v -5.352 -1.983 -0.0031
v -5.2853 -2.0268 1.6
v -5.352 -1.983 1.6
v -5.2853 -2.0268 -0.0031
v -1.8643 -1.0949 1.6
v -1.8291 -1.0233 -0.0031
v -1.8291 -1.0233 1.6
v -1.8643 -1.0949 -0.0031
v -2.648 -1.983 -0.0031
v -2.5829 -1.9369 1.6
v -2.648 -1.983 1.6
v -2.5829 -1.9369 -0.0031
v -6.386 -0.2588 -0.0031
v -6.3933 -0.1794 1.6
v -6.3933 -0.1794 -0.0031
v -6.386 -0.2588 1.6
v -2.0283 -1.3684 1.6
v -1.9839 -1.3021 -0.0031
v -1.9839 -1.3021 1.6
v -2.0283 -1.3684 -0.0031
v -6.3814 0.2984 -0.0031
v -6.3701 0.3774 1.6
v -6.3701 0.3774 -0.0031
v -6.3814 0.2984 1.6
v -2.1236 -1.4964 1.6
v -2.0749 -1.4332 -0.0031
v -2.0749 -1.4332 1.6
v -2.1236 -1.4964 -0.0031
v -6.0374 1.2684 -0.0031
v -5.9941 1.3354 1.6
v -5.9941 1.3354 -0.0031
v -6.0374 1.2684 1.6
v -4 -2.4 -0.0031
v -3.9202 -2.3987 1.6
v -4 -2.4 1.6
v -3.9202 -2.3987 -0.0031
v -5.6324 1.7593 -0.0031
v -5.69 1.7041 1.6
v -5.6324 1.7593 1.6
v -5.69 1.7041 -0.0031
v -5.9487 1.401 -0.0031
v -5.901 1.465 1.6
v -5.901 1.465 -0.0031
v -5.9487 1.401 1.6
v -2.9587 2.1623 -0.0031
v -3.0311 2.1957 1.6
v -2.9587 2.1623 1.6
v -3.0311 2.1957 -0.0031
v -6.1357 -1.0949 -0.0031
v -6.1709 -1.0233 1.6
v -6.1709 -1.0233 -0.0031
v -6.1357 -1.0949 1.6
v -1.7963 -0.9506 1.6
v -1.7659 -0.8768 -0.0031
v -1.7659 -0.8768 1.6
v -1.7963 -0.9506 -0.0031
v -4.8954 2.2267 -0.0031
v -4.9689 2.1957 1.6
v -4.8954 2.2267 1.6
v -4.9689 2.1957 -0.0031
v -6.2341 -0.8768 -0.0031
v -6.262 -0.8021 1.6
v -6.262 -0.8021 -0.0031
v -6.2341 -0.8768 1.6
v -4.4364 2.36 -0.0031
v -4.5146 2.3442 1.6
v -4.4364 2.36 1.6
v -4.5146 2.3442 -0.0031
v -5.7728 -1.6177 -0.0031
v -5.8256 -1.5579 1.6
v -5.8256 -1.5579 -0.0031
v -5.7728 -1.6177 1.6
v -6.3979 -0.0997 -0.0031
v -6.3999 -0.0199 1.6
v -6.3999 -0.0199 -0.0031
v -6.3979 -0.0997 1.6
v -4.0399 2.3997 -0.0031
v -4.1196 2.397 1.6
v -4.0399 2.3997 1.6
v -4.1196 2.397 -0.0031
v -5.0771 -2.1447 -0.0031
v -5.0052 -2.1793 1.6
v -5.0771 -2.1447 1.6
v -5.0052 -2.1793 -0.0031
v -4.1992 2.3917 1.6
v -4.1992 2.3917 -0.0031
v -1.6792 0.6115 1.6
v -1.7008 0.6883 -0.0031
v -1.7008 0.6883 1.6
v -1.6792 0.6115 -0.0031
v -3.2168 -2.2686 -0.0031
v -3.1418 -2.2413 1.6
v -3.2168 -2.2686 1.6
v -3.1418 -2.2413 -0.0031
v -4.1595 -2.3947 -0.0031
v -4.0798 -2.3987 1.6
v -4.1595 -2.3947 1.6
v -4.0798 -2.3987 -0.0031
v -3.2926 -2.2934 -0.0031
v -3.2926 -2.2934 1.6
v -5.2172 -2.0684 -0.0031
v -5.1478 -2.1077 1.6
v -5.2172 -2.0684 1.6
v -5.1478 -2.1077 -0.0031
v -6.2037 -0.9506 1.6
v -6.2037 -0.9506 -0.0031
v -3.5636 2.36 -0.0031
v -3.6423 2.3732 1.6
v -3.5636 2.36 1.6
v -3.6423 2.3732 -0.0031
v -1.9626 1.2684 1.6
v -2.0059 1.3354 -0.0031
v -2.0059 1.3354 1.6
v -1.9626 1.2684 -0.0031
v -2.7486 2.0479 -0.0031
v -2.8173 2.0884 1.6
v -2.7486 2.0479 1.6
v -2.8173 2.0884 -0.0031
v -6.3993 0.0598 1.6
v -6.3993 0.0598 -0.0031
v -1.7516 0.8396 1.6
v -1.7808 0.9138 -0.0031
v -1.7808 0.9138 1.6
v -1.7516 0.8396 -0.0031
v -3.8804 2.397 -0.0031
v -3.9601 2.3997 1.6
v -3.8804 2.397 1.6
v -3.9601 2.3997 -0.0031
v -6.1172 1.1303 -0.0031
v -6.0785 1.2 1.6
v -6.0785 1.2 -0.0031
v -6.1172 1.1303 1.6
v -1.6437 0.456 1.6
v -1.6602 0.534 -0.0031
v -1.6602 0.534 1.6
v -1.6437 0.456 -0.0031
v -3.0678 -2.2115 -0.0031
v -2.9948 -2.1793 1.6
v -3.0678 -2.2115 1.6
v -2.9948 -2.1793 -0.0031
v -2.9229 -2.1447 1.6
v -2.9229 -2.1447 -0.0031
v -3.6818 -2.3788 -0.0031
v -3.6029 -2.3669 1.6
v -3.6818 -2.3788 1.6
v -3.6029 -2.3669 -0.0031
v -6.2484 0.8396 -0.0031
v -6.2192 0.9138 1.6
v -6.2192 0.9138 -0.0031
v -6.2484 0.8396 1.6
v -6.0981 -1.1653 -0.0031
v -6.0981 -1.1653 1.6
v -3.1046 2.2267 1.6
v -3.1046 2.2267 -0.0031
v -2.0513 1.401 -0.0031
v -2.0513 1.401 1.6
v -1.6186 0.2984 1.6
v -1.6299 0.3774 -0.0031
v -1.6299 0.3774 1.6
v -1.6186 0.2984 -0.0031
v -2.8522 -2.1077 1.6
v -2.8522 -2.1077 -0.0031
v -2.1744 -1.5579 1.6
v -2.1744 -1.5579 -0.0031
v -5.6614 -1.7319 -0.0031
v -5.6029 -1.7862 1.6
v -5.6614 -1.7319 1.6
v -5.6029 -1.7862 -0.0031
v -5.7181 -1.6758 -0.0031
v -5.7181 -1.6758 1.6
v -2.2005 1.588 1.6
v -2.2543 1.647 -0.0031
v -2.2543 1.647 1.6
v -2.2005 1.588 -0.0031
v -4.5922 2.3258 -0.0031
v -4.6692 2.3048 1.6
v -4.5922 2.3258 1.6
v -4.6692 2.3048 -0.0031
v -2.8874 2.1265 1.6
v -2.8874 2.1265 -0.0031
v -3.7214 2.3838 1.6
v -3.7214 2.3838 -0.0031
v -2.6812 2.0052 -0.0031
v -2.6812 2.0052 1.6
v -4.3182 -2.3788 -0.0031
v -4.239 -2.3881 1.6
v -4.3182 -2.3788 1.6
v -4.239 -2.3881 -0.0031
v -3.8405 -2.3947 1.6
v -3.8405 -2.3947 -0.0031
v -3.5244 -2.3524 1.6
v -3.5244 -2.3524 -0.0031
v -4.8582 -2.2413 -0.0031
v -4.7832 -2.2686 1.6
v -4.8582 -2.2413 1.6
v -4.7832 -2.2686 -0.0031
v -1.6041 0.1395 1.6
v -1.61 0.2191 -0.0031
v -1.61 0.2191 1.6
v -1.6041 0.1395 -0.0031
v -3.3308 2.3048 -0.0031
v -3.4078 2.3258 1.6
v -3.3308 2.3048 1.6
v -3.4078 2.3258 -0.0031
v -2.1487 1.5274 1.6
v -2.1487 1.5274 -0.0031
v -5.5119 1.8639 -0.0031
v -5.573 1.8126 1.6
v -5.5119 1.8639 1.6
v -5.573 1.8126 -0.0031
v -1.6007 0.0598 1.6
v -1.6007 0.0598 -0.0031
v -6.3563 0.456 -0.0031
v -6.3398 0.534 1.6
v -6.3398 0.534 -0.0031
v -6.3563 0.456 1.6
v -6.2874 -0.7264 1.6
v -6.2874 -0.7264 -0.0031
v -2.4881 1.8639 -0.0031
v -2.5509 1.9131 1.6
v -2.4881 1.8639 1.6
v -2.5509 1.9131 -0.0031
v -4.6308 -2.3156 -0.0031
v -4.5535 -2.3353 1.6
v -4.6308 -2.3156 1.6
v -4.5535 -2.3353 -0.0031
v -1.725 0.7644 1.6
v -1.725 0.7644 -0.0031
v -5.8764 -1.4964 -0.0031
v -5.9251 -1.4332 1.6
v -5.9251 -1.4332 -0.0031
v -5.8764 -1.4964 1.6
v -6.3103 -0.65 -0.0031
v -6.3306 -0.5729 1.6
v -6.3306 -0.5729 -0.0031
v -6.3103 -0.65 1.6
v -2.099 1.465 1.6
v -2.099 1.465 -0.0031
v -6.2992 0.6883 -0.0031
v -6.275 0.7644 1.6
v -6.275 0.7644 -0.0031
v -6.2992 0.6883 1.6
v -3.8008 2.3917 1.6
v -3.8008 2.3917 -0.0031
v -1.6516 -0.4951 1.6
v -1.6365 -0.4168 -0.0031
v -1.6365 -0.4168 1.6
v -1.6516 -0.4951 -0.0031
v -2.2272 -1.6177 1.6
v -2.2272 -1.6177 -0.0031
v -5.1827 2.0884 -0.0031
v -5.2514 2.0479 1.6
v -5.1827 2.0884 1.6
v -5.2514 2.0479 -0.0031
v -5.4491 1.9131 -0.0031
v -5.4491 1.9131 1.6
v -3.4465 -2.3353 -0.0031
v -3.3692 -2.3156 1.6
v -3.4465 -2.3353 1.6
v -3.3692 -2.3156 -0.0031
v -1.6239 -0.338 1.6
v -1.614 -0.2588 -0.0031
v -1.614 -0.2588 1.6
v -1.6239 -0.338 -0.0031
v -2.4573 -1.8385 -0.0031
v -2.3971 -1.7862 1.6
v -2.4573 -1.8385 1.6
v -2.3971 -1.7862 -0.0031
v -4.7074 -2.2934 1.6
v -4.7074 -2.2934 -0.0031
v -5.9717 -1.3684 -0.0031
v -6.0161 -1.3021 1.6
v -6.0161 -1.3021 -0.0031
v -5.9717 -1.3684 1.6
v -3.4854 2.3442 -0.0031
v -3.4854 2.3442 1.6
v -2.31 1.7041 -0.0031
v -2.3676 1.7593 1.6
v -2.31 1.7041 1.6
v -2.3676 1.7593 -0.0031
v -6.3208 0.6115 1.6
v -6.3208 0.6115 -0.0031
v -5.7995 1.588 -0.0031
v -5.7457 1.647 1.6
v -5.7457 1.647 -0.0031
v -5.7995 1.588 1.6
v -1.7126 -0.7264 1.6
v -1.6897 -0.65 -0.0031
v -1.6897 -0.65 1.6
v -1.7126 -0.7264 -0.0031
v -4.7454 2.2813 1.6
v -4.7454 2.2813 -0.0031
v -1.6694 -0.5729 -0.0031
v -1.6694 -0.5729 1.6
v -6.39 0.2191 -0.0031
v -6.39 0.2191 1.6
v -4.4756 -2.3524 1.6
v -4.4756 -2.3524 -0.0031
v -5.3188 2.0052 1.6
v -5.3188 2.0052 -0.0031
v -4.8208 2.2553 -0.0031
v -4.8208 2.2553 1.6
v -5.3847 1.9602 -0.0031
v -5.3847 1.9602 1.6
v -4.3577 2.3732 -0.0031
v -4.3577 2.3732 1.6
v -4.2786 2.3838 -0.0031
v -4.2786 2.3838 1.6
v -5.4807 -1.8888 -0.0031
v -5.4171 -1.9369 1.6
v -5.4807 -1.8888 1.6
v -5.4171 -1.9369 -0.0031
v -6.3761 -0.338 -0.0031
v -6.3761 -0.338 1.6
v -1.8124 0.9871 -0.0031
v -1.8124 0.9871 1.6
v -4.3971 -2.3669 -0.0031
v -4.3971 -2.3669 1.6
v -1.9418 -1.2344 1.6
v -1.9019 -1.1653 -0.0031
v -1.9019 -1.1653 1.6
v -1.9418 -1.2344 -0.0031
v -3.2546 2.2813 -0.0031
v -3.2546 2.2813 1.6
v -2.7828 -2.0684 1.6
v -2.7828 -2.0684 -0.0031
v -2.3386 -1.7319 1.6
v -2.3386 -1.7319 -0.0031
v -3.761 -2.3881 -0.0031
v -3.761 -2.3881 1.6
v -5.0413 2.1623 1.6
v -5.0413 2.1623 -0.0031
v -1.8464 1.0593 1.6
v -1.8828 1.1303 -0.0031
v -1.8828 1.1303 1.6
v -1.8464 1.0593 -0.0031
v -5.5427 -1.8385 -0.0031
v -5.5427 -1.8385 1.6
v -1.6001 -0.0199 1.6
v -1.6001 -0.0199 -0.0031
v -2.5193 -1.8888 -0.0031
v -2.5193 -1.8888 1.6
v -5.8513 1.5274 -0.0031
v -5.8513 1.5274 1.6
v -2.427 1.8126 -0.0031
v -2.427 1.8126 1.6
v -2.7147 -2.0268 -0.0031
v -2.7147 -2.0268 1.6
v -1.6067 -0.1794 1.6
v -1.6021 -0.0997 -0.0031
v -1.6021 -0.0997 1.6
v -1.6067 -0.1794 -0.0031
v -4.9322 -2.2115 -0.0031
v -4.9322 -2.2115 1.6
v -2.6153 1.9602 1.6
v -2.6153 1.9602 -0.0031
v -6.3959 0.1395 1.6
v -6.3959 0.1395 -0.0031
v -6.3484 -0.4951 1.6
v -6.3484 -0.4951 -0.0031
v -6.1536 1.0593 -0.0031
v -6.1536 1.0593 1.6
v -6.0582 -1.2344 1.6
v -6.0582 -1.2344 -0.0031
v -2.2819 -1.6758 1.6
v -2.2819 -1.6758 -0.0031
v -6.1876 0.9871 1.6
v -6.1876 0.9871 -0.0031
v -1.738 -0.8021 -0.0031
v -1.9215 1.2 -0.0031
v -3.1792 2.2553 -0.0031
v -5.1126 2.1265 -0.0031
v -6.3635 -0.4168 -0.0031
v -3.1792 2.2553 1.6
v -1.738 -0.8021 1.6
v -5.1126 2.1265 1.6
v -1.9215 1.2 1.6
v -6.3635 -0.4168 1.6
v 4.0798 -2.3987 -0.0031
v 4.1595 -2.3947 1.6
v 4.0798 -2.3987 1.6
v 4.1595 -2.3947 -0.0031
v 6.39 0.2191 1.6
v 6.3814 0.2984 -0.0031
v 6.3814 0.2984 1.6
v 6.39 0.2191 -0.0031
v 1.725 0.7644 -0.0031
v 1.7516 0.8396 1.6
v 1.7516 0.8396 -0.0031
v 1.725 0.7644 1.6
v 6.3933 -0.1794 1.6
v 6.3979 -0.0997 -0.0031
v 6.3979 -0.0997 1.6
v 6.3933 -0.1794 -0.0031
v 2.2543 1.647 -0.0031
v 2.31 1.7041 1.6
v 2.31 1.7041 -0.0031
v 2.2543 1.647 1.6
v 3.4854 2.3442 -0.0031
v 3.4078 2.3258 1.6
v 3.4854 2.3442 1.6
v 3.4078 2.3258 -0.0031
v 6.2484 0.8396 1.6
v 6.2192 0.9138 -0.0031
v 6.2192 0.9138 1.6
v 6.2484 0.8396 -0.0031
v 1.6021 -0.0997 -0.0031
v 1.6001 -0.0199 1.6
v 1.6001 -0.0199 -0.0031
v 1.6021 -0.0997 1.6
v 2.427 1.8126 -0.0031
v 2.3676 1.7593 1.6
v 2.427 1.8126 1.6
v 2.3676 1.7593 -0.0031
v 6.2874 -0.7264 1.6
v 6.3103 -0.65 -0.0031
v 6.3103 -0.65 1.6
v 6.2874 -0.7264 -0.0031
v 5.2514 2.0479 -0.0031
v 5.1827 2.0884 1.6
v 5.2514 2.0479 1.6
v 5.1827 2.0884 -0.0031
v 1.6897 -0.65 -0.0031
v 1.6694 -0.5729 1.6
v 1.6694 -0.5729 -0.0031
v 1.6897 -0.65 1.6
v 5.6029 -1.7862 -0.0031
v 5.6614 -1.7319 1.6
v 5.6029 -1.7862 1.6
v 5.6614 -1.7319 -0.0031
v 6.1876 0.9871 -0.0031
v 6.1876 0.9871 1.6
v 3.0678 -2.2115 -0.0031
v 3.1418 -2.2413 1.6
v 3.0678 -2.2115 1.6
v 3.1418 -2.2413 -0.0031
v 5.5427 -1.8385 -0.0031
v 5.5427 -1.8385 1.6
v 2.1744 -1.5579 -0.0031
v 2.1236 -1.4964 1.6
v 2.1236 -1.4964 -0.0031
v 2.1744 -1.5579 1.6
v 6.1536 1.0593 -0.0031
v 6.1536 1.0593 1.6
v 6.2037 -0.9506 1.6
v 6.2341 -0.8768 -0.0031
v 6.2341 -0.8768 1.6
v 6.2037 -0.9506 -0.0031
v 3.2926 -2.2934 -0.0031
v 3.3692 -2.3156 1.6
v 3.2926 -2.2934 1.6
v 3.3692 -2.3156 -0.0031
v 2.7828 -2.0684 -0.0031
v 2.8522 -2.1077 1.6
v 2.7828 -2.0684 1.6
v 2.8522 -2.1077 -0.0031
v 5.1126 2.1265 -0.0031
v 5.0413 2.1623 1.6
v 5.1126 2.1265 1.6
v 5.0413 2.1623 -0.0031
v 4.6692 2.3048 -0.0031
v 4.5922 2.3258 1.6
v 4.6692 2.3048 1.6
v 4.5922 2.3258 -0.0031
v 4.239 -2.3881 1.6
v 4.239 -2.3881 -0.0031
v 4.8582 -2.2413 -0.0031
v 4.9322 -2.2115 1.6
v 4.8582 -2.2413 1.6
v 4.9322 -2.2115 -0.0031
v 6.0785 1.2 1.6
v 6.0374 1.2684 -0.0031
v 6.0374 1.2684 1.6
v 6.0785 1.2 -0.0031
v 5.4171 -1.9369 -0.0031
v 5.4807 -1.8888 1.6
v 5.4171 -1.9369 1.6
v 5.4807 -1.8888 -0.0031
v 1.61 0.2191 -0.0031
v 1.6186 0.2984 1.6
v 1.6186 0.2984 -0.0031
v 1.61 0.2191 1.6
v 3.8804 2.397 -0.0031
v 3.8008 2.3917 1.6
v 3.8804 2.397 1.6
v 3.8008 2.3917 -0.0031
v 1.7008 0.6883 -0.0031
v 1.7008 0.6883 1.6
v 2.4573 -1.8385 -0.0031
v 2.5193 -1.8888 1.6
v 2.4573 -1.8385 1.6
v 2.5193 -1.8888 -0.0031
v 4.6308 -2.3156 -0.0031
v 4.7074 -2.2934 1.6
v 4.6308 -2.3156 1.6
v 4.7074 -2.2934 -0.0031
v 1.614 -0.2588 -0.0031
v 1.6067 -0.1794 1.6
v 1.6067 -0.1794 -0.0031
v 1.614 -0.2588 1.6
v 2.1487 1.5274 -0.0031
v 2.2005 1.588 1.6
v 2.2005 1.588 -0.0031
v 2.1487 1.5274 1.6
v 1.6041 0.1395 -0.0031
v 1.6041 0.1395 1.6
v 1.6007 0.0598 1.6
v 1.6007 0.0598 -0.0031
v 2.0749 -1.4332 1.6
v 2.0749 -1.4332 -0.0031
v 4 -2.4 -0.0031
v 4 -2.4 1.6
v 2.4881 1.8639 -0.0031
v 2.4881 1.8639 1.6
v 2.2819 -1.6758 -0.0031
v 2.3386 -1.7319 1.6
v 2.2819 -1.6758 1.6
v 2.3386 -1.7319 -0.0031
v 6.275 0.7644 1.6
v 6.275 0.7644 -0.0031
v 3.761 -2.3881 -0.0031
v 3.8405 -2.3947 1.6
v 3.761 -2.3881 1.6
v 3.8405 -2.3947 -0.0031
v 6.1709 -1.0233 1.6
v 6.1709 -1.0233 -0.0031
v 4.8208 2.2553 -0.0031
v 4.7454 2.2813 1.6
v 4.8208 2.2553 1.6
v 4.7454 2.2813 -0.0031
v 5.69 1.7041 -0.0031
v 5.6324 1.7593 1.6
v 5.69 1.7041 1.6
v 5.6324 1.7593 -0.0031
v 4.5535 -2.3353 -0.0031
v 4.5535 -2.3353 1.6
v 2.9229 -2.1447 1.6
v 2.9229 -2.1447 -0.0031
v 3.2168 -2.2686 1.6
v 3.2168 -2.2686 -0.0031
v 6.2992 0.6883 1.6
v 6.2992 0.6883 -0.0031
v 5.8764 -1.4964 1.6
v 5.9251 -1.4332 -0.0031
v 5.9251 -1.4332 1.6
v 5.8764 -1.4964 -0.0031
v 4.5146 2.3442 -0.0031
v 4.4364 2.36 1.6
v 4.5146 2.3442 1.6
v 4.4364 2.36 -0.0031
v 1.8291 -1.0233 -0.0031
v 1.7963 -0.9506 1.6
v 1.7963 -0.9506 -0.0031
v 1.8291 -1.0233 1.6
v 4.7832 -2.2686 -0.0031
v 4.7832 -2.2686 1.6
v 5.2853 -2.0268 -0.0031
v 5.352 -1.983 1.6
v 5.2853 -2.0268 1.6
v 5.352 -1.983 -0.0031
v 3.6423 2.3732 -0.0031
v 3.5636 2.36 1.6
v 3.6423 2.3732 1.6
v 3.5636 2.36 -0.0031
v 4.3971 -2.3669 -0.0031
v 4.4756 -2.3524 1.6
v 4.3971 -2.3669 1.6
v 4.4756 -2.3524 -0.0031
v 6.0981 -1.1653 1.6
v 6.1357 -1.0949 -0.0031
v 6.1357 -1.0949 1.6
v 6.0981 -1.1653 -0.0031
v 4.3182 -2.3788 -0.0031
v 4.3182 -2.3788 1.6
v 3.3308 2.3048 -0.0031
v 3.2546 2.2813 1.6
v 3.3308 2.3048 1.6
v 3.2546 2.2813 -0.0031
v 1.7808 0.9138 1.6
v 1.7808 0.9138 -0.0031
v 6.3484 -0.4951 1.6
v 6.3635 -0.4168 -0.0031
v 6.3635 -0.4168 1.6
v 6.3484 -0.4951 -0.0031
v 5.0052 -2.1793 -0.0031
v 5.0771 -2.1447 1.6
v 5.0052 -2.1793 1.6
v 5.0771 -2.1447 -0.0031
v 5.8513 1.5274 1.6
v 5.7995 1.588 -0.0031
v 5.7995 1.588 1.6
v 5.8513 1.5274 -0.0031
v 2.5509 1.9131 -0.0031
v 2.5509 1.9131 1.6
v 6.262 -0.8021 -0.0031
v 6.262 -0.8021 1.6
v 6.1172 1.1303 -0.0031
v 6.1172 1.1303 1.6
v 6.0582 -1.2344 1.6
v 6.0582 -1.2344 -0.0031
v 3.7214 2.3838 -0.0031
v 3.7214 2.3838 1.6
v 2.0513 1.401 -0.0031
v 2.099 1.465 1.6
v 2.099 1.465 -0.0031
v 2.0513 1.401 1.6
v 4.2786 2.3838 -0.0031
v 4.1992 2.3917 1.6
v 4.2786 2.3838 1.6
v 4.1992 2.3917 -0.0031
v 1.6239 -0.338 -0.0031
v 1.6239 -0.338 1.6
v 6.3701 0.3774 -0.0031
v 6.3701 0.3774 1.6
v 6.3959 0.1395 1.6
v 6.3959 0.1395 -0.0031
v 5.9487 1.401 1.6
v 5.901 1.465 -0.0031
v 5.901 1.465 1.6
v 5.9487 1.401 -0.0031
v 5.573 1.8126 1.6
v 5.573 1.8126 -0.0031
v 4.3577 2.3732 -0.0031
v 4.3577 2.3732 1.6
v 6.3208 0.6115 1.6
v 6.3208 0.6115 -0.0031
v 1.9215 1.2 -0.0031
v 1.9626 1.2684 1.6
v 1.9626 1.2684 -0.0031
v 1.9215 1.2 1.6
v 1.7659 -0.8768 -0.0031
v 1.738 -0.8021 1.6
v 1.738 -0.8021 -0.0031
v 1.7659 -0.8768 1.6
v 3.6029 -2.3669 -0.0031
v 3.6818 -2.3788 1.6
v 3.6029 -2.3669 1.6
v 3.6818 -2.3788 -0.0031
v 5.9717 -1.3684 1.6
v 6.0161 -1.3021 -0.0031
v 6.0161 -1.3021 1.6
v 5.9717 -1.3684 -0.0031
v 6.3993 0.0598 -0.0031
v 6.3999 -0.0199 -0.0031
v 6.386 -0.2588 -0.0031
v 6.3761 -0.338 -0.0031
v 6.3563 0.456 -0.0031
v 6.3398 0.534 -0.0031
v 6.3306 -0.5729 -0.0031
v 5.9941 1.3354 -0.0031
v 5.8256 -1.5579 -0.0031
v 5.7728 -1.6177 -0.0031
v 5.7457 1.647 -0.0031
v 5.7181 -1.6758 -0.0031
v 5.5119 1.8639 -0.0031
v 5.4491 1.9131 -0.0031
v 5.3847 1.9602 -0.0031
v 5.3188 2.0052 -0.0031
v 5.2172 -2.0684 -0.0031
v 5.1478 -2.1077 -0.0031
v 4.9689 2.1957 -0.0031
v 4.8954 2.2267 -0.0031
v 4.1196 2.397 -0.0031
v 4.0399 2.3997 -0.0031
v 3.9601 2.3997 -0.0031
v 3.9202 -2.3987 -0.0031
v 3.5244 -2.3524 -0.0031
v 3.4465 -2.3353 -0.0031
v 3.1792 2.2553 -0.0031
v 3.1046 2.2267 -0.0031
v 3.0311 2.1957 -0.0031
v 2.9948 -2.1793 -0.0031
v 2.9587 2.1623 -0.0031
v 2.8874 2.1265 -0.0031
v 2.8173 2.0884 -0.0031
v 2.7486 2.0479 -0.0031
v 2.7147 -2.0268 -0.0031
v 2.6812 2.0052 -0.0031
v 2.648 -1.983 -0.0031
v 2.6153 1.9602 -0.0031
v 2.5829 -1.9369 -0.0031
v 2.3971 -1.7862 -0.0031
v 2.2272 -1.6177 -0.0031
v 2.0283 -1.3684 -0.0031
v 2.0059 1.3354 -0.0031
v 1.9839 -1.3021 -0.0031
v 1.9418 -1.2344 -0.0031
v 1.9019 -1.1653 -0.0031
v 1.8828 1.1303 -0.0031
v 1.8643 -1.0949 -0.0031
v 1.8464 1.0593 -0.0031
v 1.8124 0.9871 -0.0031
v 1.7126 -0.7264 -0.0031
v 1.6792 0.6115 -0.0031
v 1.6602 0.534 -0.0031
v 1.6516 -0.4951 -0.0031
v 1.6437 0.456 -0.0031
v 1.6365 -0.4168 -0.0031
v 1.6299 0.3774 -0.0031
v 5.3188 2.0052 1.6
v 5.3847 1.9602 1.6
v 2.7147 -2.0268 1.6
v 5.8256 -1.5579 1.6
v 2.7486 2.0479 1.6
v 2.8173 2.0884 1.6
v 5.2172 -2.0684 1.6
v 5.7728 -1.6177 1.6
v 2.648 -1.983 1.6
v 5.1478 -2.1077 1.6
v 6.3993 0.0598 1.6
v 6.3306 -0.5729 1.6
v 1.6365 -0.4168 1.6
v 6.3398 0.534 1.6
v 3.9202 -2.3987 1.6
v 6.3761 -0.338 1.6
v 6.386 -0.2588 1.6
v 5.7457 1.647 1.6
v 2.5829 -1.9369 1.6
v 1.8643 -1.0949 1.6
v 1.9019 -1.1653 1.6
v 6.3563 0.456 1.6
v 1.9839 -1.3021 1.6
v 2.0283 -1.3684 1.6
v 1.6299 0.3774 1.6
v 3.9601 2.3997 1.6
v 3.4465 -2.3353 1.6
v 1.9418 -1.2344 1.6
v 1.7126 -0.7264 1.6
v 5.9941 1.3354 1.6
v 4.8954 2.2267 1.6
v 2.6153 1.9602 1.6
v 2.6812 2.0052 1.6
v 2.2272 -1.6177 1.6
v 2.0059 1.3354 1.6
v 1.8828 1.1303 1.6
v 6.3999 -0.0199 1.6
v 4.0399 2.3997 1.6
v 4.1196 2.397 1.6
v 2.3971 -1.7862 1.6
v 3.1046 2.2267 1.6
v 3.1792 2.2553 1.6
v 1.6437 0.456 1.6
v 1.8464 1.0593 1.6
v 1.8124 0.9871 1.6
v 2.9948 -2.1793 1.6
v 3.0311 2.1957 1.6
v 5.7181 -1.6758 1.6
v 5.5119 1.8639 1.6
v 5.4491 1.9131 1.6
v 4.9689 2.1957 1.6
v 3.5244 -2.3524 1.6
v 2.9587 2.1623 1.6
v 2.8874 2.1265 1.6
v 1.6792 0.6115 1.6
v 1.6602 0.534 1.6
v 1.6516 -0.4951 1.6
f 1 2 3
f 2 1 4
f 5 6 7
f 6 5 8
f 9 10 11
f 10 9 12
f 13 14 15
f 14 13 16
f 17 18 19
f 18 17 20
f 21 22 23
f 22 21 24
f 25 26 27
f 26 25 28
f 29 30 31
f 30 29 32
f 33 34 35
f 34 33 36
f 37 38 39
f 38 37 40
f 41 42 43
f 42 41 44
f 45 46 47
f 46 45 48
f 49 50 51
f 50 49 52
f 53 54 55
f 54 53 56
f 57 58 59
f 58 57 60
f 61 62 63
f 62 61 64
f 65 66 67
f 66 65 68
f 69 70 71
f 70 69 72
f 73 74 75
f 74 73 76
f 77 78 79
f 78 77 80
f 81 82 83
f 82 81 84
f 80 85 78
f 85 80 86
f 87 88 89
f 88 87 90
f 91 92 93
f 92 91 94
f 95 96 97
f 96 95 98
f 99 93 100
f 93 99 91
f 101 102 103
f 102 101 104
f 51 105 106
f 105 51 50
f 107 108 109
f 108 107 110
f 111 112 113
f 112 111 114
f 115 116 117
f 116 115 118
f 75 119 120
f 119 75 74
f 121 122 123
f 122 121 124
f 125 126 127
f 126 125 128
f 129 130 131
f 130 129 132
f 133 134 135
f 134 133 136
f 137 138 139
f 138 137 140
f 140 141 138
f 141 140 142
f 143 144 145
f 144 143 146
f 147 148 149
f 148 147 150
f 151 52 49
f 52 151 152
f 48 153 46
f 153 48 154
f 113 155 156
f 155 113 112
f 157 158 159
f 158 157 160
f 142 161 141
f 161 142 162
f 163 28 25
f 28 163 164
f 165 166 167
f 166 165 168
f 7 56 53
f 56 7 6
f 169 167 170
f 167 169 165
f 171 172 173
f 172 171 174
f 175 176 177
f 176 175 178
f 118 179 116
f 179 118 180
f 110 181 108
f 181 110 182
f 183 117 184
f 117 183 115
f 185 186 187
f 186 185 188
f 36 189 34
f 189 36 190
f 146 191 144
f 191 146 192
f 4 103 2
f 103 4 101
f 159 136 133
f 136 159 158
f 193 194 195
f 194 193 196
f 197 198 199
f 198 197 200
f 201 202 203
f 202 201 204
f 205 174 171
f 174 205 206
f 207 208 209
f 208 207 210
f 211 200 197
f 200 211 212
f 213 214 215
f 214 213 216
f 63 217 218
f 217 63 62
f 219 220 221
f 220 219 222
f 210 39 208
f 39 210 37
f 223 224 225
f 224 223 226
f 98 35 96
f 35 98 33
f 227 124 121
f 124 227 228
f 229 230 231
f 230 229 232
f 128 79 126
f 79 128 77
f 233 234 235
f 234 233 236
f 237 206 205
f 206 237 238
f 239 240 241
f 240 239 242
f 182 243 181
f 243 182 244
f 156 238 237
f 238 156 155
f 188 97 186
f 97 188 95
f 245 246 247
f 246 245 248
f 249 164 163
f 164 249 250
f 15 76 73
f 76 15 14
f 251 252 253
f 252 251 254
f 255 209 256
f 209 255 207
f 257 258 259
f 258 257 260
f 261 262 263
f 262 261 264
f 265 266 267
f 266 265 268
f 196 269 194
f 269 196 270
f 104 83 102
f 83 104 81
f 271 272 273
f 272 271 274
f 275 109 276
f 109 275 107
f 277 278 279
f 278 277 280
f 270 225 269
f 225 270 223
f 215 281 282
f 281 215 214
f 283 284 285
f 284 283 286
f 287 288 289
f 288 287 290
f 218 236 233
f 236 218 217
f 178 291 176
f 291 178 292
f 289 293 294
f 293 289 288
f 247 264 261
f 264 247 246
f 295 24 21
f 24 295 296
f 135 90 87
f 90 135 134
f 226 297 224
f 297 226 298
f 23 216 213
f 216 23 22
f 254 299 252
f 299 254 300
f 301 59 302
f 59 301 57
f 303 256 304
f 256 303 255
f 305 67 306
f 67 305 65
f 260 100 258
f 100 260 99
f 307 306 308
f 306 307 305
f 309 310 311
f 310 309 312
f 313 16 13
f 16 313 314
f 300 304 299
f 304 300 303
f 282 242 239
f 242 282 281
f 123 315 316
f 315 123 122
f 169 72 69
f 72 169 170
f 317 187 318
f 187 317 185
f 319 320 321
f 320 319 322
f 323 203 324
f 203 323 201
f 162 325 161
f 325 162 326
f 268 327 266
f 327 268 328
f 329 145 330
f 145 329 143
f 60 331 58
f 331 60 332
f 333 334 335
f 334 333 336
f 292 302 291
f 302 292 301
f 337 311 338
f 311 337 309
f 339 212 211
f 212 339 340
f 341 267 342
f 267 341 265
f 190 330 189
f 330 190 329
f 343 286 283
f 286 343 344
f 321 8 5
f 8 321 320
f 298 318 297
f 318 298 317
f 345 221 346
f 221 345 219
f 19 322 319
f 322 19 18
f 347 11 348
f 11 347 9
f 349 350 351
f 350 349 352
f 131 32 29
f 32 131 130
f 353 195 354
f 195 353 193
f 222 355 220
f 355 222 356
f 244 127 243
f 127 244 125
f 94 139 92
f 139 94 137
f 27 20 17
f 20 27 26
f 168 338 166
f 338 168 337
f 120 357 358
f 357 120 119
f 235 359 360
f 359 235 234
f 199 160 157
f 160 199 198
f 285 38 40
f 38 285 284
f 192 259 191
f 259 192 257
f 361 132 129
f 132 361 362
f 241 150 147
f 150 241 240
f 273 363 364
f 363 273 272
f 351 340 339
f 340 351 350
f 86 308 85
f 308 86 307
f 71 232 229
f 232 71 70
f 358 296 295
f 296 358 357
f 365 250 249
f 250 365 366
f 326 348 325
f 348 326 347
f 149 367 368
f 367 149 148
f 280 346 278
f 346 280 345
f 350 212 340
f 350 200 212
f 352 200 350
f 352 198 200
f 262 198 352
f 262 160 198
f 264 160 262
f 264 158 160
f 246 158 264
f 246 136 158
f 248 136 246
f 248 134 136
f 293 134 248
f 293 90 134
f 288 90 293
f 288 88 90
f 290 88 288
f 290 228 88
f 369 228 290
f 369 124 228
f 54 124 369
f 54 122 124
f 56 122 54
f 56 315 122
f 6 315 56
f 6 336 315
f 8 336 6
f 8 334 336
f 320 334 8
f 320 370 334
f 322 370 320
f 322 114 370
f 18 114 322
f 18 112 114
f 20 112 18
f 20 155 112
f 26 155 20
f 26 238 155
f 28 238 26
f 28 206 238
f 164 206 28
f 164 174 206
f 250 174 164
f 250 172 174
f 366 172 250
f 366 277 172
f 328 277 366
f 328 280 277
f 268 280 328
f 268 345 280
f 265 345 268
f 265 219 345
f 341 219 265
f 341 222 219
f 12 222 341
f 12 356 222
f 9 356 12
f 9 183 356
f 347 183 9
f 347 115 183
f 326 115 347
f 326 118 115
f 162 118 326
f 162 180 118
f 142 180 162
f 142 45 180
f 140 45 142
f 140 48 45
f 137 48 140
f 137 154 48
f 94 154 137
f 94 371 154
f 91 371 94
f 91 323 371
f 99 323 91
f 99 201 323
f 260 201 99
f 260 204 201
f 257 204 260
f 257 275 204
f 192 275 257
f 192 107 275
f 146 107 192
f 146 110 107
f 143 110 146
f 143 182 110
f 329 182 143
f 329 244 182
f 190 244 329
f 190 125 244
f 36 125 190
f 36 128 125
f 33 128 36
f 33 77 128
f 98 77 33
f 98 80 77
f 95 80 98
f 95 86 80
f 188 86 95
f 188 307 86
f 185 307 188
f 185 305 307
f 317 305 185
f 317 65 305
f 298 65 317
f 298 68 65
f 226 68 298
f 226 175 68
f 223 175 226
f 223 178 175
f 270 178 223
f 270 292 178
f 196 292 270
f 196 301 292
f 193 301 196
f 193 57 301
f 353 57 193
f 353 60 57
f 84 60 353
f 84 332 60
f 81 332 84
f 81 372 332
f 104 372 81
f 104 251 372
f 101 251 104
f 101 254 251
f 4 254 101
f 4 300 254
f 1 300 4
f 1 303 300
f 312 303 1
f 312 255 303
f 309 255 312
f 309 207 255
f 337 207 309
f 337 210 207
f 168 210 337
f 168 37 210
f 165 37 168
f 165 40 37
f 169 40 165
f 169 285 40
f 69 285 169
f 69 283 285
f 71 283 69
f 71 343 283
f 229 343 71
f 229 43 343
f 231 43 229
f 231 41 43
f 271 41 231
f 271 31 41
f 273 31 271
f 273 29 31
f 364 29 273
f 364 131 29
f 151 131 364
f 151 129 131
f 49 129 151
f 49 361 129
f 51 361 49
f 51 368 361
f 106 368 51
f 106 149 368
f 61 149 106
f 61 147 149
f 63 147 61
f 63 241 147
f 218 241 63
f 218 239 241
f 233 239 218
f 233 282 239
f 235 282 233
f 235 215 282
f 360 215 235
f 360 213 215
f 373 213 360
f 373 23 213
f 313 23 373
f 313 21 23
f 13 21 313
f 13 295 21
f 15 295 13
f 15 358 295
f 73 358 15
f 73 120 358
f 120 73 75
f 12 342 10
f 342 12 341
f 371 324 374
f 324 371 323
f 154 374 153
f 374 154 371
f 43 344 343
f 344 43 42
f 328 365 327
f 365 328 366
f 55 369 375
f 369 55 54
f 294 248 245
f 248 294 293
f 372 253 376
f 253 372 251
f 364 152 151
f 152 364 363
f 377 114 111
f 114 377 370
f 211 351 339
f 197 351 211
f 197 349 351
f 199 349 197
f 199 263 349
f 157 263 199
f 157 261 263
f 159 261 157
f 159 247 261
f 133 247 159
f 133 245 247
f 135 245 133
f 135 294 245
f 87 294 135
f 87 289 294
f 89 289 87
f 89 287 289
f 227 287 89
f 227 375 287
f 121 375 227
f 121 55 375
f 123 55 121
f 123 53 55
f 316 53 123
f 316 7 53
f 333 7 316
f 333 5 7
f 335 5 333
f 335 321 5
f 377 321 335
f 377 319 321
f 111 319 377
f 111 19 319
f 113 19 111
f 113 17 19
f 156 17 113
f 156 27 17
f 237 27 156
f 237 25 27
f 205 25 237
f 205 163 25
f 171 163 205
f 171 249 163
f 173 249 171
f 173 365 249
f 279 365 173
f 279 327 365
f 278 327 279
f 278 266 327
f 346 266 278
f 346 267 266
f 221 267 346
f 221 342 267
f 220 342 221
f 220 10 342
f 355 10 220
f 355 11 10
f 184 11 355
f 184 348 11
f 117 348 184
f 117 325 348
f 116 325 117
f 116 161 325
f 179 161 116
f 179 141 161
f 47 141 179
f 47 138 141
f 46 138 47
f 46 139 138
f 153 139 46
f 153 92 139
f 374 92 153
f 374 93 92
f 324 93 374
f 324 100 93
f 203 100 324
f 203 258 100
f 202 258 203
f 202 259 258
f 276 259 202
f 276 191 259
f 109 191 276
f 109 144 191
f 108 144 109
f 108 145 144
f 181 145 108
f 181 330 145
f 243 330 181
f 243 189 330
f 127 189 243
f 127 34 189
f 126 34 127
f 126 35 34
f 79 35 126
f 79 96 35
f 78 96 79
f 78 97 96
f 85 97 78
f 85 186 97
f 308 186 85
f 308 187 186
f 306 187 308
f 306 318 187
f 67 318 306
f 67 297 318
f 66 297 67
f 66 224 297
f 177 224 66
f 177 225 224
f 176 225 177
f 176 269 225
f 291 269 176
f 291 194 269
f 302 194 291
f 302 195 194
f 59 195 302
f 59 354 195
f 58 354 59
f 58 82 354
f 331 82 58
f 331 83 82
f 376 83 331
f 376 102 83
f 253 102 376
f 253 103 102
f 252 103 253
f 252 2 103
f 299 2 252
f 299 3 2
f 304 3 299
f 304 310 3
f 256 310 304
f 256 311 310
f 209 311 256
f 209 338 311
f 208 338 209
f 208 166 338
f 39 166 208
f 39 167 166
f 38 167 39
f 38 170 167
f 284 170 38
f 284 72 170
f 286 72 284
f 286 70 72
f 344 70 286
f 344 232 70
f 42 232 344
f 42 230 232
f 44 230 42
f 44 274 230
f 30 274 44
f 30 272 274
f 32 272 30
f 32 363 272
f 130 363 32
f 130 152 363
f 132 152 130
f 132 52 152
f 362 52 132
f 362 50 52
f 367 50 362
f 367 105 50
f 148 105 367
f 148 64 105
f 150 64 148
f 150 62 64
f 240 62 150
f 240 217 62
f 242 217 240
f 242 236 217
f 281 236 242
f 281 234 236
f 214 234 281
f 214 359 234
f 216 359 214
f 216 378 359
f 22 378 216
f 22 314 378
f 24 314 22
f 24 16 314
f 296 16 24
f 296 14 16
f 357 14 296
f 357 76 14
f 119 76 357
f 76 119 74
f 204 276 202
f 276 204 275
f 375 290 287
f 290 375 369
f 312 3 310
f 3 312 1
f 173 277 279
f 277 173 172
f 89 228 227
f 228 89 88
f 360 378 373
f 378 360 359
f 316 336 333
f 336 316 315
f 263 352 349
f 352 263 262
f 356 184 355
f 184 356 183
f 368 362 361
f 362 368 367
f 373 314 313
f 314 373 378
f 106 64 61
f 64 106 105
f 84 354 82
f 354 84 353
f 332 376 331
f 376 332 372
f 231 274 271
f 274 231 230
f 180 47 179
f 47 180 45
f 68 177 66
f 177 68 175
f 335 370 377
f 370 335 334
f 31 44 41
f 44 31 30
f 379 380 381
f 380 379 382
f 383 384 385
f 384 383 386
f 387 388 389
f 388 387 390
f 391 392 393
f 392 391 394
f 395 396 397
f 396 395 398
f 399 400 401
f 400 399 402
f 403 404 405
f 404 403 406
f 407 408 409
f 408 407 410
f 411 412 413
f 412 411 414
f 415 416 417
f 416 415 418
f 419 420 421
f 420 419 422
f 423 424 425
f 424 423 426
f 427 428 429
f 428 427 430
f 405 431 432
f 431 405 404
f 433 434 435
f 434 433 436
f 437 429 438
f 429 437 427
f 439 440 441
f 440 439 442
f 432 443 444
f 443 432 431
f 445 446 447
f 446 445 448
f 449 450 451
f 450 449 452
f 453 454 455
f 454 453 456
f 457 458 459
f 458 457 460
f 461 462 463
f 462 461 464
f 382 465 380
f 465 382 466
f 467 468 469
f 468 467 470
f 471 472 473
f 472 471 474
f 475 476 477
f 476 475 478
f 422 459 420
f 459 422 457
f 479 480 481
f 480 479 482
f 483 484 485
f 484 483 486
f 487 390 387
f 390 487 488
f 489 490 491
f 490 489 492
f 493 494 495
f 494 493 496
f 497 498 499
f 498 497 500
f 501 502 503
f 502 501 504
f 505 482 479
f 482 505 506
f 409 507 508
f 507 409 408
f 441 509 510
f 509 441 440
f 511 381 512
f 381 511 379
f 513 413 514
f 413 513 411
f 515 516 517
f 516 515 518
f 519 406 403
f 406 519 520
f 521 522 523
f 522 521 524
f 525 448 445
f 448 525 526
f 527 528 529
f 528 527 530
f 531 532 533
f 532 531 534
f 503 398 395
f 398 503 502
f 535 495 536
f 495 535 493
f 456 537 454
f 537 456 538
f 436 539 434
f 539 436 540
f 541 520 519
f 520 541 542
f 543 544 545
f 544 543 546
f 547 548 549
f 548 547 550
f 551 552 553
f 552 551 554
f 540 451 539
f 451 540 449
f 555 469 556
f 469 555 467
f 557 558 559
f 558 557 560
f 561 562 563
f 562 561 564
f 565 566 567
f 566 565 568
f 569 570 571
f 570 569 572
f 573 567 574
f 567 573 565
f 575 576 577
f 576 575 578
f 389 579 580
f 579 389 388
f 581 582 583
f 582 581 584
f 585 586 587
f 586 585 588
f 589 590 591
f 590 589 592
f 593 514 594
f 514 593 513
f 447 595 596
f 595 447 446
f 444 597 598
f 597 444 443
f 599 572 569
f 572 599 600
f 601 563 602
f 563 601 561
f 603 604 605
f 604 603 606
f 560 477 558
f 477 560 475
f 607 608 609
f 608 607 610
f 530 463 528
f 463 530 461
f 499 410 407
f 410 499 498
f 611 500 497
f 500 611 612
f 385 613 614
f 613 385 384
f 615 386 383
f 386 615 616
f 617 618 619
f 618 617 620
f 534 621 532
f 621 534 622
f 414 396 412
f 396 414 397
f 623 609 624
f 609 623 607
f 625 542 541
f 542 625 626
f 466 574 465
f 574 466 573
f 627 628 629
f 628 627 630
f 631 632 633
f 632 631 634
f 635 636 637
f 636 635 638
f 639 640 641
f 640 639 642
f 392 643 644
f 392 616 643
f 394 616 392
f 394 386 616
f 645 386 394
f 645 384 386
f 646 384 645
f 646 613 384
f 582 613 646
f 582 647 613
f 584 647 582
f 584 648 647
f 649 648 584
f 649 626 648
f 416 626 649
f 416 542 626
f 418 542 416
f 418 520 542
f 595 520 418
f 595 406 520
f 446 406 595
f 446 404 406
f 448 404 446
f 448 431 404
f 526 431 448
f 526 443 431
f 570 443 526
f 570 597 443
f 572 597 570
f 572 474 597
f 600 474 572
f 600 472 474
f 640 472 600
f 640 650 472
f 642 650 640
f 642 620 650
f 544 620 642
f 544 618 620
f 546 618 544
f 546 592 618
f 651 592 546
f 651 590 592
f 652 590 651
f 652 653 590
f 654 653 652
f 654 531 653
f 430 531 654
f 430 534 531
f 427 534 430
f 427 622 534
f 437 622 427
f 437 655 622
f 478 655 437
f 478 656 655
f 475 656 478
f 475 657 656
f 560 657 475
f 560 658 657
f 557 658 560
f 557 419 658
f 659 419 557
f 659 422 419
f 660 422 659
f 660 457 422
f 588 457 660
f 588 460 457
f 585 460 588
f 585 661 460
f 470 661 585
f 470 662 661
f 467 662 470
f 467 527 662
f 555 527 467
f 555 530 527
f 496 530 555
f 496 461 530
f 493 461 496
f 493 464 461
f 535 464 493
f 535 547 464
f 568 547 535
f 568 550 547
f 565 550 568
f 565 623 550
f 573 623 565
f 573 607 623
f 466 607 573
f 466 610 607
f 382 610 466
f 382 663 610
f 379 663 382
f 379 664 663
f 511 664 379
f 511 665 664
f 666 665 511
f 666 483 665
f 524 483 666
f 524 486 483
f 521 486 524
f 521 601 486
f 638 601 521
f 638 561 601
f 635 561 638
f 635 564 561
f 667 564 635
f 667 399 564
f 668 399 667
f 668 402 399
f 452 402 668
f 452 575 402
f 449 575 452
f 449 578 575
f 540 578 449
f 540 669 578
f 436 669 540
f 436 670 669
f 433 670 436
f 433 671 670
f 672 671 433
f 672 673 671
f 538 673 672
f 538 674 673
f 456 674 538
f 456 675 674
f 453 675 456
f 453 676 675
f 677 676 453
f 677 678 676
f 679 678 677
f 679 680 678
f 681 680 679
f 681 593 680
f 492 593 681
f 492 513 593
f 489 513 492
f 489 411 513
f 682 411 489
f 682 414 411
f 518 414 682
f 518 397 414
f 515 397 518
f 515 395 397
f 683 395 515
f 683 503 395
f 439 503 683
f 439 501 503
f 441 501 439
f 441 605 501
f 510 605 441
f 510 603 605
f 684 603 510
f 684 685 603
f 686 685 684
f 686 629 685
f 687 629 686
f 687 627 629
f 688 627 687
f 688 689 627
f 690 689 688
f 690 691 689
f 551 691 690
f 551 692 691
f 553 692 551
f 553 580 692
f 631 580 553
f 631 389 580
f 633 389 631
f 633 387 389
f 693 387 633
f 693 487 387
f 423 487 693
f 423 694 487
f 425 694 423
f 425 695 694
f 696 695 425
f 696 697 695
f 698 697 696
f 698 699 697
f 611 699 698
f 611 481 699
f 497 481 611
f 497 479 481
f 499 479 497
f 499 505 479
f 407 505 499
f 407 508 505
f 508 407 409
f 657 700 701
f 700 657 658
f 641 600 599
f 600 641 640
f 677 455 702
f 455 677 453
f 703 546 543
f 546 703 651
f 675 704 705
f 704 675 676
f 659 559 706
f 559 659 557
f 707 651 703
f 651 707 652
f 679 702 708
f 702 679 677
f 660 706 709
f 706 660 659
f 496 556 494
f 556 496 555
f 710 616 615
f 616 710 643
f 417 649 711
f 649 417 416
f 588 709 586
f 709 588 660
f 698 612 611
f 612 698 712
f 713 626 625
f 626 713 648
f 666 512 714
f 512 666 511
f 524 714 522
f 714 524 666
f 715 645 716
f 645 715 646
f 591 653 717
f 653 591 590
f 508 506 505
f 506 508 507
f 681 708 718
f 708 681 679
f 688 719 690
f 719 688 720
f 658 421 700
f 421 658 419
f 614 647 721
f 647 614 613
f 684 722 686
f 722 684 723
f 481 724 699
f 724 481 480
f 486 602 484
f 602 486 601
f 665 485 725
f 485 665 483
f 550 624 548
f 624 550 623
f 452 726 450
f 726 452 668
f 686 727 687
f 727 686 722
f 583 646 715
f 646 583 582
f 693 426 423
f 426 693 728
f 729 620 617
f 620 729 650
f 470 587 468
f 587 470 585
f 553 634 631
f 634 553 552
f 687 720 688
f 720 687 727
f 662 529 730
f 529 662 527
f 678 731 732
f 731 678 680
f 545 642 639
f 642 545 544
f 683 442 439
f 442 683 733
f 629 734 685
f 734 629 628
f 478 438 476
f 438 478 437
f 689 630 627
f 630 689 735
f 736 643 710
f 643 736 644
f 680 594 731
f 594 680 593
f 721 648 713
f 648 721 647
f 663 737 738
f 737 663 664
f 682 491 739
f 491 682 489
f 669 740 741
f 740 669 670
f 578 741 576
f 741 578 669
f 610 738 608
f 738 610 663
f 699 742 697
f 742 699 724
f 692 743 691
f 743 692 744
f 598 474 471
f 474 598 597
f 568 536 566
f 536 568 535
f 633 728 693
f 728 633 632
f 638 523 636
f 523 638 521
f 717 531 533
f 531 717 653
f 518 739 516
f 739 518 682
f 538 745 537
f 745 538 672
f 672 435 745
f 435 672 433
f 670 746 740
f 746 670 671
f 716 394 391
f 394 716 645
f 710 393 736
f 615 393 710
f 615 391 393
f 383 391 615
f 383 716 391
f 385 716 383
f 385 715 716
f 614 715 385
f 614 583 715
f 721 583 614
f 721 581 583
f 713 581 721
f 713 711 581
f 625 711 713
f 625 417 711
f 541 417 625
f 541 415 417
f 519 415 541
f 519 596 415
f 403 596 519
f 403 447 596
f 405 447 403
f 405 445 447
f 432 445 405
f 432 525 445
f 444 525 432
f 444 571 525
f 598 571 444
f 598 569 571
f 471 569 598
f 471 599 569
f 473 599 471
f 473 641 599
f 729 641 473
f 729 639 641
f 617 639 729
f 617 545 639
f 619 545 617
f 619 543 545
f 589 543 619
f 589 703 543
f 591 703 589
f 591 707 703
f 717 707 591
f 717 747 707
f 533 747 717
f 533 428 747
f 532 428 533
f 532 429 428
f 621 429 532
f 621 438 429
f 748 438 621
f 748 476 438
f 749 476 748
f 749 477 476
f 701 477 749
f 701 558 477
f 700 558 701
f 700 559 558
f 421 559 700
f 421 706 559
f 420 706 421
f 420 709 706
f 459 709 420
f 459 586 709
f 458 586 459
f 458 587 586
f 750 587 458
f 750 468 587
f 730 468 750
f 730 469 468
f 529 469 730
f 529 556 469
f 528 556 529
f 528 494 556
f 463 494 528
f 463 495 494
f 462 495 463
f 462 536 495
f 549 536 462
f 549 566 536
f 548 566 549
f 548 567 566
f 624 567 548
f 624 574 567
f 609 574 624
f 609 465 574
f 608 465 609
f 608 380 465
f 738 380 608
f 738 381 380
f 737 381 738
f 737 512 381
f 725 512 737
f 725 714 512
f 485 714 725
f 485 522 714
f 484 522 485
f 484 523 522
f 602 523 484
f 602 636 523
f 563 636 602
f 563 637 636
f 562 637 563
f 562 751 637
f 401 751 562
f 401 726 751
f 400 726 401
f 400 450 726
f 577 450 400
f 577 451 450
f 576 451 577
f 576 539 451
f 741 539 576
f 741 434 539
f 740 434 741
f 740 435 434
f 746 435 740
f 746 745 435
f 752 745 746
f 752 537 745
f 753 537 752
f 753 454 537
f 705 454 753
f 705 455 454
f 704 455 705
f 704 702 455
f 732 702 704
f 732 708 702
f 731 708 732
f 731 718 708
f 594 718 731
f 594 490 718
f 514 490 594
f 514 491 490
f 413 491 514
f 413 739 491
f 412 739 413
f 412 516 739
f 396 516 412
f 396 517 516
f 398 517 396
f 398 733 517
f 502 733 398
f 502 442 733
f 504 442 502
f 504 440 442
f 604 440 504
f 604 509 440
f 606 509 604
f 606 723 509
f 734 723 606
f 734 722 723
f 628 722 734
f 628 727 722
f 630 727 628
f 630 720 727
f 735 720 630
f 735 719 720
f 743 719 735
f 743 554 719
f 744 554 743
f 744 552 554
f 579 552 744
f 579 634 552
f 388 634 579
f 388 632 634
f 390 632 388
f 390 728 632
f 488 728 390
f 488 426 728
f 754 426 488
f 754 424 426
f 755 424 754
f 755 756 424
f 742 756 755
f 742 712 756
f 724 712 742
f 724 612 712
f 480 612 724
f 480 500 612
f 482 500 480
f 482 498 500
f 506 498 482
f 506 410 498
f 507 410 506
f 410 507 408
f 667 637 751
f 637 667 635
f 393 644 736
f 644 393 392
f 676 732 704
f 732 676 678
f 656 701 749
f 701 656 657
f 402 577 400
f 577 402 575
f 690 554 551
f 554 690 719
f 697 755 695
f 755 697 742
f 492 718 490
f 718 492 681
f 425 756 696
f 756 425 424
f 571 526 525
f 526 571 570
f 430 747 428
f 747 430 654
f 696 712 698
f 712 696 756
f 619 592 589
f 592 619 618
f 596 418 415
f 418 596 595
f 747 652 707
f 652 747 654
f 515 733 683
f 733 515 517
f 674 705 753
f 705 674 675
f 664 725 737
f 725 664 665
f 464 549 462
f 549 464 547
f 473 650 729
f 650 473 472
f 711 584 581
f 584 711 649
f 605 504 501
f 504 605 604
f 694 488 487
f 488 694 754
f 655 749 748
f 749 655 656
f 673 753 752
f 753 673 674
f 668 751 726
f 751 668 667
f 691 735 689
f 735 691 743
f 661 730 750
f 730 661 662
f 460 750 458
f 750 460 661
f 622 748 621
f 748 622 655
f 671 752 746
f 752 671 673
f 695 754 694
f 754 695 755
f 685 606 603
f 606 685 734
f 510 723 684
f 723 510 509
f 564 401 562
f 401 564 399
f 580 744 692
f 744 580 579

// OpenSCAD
use <../lib.scad>
use <../p/1-4disc.scad>
use <../p/1-4ring4.scad>
use <s/3298s01.scad>
$fa=1; $fs=0.2;
function ldraw_lib__3298p71(realsolid=false) = [
// 0 Slope Brick 33  3 x  2 with Red "1" and Yellow Outline Pattern
// 0 Name: 3298p71.dat
// 0 Author: J.C. Tchang [tchang]
// 0 !LDRAW_ORG Part UPDATE 2011-01
// 0 !LICENSE Licensed under CC BY 2.0 and CC BY 4.0 : see CAreadme.txt
// 
// 0 BFC CERTIFY CCW
  [0,"BFC","CERTIFY"],
  [0,"BFC","CCW"],
// 
// 0 !HISTORY 2011-07-25 [PTadmin] Official Update 2011-01
// 
// 
// 1 16 0 0 0 1 0 0 0 1 0 0 0 1 s\3298s01.dat
  [1,16,0,0,0,1,0,0,0,1,0,0,0,1, ldraw_lib__s__3298s01(realsolid)],
// 0 //
// 4 4 -1.5 6.887 -23.774 -5.5 4.919 -19.839 -8.8 4.919 -19.839 -8.8 6.887 -23.774
  [4,4,-1.5,6.887,-23.774,-5.5,4.919,-19.839,-8.8,4.919,-19.839,-8.8,6.887,-23.774],
// 4 4 4.7 18.202 -46.403 4.7 2.683 -15.367 -1.5 6.887 -23.774 -1.5 18.202 -46.403
  [4,4,4.7,18.202,-46.403,4.7,2.683,-15.367,-1.5,6.887,-23.774,-1.5,18.202,-46.403],
// 4 4 4.7 2.683 -15.367 -0.881 3.539 -17.078 -1.964 4.264 -18.529 -1.5 6.887 -23.774
  [4,4,4.7,2.683,-15.367,-0.881,3.539,-17.078,-1.964,4.264,-18.529,-1.5,6.887,-23.774],
// 3 4 -3.587 4.749 -19.498 -5.5 4.919 -19.839 -1.5 6.887 -23.774
  [3,4,-3.587,4.749,-19.498,-5.5,4.919,-19.839,-1.5,6.887,-23.774],
// 3 4 -1.5 6.887 -23.774 -1.964 4.264 -18.529 -3.587 4.749 -19.498
  [3,4,-1.5,6.887,-23.774,-1.964,4.264,-18.529,-3.587,4.749,-19.498],
// 3 4 4.7 2.683 -15.367 -0.5 2.683 -15.367 -0.881 3.539 -17.078
  [3,4,4.7,2.683,-15.367,-0.5,2.683,-15.367,-0.881,3.539,-17.078],
// 0 //
// 1 14 -5.5 2.683 -15.367 0 0 1 0.4472 0.8944 0 -0.8944 0.4472 0 1-4ring4.dat
  [1,14,-5.5,2.683,-15.367,0,0,1,0.4472,0.8944,0,-0.8944,0.4472,0, ldraw_lib__1_4ring4(realsolid)],
// 4 14 -10 4.472 -18.944 -8.8 4.919 -19.839 -5.5 4.919 -19.839 -5.5 4.472 -18.944
  [4,14,-10,4.472,-18.944,-8.8,4.919,-19.839,-5.5,4.919,-19.839,-5.5,4.472,-18.944],
// 4 14 -8.8 6.887 -23.774 -8.8 4.919 -19.839 -10 4.472 -18.944 -10 7.379 -24.758
  [4,14,-8.8,6.887,-23.774,-8.8,4.919,-19.839,-10,4.472,-18.944,-10,7.379,-24.758],
// 4 14 -1.5 6.887 -23.774 -8.8 6.887 -23.774 -10 7.379 -24.758 -2.7 7.379 -24.758
  [4,14,-1.5,6.887,-23.774,-8.8,6.887,-23.774,-10,7.379,-24.758,-2.7,7.379,-24.758],
// 4 14 -1.5 18.202 -46.403 -1.5 6.887 -23.774 -2.7 7.379 -24.758 -2.7 18.693 -47.387
  [4,14,-1.5,18.202,-46.403,-1.5,6.887,-23.774,-2.7,7.379,-24.758,-2.7,18.693,-47.387],
// 4 14 4.7 18.202 -46.403 -1.5 18.202 -46.403 -2.7 18.693 -47.387 5.9 18.693 -47.387
  [4,14,4.7,18.202,-46.403,-1.5,18.202,-46.403,-2.7,18.693,-47.387,5.9,18.693,-47.387],
// 4 14 4.7 2.683 -15.367 4.7 18.202 -46.403 5.9 18.693 -47.387 5.9 2.147 -14.293
  [4,14,4.7,2.683,-15.367,4.7,18.202,-46.403,5.9,18.693,-47.387,5.9,2.147,-14.293],
// 4 14 -0.5 2.683 -15.367 4.7 2.683 -15.367 5.9 2.147 -14.293 -1.5 2.147 -14.293
  [4,14,-0.5,2.683,-15.367,4.7,2.683,-15.367,5.9,2.147,-14.293,-1.5,2.147,-14.293],
// 3 14 -1.5 2.147 -14.293 -1.5 2.683 -15.367 -0.5 2.683 -15.367
  [3,14,-1.5,2.147,-14.293,-1.5,2.683,-15.367,-0.5,2.683,-15.367],
// 0 //
// 1 16 -5.5 2.683 -15.367 0 0 4 1.7889 3.5777 0 -3.5777 1.7889 0 1-4disc.dat
  [1,16,-5.5,2.683,-15.367,0,0,4,1.7889,3.5777,0,-3.5777,1.7889,0, ldraw_lib__1_4disc(realsolid)],
// 4 16 -20 0 -10 -1.5 2.147 -14.293 5.9 2.147 -14.293 20 0 -10
  [4,16,-20,0,-10,-1.5,2.147,-14.293,5.9,2.147,-14.293,20,0,-10],
// 4 16 -1.5 2.683 -15.367 -1.5 2.147 -14.293 -20 0 -10 -5.5 2.683 -15.367
  [4,16,-1.5,2.683,-15.367,-1.5,2.147,-14.293,-20,0,-10,-5.5,2.683,-15.367],
// 4 16 -10 4.472 -18.944 -5.5 4.472 -18.944 -5.5 2.683 -15.367 -20 0 -10
  [4,16,-10,4.472,-18.944,-5.5,4.472,-18.944,-5.5,2.683,-15.367,-20,0,-10],
// 4 16 -10 7.379 -24.758 -10 4.472 -18.944 -20 0 -10 -20 20 -50
  [4,16,-10,7.379,-24.758,-10,4.472,-18.944,-20,0,-10,-20,20,-50],
// 4 16 -2.7 7.379 -24.758 -10 7.379 -24.758 -20 20 -50 -2.7 18.693 -47.387
  [4,16,-2.7,7.379,-24.758,-10,7.379,-24.758,-20,20,-50,-2.7,18.693,-47.387],
// 4 16 -2.7 18.693 -47.387 -20 20 -50 20 20 -50 5.9 18.693 -47.387
  [4,16,-2.7,18.693,-47.387,-20,20,-50,20,20,-50,5.9,18.693,-47.387],
// 4 16 5.9 18.693 -47.387 20 20 -50 20 0 -10 5.9 2.147 -14.293
  [4,16,5.9,18.693,-47.387,20,20,-50,20,0,-10,5.9,2.147,-14.293],
];
module ldraw_lib__3298p71(step=0, col=false, unit=2/5, alt=false, line=0.2, solid=!$preview)
    makepoly(ldraw_lib__3298p71(solid), step=step, col=col, unit=unit, alt=alt, line=line, solid=solid);
ldraw_lib__3298p71(line=0.2);
